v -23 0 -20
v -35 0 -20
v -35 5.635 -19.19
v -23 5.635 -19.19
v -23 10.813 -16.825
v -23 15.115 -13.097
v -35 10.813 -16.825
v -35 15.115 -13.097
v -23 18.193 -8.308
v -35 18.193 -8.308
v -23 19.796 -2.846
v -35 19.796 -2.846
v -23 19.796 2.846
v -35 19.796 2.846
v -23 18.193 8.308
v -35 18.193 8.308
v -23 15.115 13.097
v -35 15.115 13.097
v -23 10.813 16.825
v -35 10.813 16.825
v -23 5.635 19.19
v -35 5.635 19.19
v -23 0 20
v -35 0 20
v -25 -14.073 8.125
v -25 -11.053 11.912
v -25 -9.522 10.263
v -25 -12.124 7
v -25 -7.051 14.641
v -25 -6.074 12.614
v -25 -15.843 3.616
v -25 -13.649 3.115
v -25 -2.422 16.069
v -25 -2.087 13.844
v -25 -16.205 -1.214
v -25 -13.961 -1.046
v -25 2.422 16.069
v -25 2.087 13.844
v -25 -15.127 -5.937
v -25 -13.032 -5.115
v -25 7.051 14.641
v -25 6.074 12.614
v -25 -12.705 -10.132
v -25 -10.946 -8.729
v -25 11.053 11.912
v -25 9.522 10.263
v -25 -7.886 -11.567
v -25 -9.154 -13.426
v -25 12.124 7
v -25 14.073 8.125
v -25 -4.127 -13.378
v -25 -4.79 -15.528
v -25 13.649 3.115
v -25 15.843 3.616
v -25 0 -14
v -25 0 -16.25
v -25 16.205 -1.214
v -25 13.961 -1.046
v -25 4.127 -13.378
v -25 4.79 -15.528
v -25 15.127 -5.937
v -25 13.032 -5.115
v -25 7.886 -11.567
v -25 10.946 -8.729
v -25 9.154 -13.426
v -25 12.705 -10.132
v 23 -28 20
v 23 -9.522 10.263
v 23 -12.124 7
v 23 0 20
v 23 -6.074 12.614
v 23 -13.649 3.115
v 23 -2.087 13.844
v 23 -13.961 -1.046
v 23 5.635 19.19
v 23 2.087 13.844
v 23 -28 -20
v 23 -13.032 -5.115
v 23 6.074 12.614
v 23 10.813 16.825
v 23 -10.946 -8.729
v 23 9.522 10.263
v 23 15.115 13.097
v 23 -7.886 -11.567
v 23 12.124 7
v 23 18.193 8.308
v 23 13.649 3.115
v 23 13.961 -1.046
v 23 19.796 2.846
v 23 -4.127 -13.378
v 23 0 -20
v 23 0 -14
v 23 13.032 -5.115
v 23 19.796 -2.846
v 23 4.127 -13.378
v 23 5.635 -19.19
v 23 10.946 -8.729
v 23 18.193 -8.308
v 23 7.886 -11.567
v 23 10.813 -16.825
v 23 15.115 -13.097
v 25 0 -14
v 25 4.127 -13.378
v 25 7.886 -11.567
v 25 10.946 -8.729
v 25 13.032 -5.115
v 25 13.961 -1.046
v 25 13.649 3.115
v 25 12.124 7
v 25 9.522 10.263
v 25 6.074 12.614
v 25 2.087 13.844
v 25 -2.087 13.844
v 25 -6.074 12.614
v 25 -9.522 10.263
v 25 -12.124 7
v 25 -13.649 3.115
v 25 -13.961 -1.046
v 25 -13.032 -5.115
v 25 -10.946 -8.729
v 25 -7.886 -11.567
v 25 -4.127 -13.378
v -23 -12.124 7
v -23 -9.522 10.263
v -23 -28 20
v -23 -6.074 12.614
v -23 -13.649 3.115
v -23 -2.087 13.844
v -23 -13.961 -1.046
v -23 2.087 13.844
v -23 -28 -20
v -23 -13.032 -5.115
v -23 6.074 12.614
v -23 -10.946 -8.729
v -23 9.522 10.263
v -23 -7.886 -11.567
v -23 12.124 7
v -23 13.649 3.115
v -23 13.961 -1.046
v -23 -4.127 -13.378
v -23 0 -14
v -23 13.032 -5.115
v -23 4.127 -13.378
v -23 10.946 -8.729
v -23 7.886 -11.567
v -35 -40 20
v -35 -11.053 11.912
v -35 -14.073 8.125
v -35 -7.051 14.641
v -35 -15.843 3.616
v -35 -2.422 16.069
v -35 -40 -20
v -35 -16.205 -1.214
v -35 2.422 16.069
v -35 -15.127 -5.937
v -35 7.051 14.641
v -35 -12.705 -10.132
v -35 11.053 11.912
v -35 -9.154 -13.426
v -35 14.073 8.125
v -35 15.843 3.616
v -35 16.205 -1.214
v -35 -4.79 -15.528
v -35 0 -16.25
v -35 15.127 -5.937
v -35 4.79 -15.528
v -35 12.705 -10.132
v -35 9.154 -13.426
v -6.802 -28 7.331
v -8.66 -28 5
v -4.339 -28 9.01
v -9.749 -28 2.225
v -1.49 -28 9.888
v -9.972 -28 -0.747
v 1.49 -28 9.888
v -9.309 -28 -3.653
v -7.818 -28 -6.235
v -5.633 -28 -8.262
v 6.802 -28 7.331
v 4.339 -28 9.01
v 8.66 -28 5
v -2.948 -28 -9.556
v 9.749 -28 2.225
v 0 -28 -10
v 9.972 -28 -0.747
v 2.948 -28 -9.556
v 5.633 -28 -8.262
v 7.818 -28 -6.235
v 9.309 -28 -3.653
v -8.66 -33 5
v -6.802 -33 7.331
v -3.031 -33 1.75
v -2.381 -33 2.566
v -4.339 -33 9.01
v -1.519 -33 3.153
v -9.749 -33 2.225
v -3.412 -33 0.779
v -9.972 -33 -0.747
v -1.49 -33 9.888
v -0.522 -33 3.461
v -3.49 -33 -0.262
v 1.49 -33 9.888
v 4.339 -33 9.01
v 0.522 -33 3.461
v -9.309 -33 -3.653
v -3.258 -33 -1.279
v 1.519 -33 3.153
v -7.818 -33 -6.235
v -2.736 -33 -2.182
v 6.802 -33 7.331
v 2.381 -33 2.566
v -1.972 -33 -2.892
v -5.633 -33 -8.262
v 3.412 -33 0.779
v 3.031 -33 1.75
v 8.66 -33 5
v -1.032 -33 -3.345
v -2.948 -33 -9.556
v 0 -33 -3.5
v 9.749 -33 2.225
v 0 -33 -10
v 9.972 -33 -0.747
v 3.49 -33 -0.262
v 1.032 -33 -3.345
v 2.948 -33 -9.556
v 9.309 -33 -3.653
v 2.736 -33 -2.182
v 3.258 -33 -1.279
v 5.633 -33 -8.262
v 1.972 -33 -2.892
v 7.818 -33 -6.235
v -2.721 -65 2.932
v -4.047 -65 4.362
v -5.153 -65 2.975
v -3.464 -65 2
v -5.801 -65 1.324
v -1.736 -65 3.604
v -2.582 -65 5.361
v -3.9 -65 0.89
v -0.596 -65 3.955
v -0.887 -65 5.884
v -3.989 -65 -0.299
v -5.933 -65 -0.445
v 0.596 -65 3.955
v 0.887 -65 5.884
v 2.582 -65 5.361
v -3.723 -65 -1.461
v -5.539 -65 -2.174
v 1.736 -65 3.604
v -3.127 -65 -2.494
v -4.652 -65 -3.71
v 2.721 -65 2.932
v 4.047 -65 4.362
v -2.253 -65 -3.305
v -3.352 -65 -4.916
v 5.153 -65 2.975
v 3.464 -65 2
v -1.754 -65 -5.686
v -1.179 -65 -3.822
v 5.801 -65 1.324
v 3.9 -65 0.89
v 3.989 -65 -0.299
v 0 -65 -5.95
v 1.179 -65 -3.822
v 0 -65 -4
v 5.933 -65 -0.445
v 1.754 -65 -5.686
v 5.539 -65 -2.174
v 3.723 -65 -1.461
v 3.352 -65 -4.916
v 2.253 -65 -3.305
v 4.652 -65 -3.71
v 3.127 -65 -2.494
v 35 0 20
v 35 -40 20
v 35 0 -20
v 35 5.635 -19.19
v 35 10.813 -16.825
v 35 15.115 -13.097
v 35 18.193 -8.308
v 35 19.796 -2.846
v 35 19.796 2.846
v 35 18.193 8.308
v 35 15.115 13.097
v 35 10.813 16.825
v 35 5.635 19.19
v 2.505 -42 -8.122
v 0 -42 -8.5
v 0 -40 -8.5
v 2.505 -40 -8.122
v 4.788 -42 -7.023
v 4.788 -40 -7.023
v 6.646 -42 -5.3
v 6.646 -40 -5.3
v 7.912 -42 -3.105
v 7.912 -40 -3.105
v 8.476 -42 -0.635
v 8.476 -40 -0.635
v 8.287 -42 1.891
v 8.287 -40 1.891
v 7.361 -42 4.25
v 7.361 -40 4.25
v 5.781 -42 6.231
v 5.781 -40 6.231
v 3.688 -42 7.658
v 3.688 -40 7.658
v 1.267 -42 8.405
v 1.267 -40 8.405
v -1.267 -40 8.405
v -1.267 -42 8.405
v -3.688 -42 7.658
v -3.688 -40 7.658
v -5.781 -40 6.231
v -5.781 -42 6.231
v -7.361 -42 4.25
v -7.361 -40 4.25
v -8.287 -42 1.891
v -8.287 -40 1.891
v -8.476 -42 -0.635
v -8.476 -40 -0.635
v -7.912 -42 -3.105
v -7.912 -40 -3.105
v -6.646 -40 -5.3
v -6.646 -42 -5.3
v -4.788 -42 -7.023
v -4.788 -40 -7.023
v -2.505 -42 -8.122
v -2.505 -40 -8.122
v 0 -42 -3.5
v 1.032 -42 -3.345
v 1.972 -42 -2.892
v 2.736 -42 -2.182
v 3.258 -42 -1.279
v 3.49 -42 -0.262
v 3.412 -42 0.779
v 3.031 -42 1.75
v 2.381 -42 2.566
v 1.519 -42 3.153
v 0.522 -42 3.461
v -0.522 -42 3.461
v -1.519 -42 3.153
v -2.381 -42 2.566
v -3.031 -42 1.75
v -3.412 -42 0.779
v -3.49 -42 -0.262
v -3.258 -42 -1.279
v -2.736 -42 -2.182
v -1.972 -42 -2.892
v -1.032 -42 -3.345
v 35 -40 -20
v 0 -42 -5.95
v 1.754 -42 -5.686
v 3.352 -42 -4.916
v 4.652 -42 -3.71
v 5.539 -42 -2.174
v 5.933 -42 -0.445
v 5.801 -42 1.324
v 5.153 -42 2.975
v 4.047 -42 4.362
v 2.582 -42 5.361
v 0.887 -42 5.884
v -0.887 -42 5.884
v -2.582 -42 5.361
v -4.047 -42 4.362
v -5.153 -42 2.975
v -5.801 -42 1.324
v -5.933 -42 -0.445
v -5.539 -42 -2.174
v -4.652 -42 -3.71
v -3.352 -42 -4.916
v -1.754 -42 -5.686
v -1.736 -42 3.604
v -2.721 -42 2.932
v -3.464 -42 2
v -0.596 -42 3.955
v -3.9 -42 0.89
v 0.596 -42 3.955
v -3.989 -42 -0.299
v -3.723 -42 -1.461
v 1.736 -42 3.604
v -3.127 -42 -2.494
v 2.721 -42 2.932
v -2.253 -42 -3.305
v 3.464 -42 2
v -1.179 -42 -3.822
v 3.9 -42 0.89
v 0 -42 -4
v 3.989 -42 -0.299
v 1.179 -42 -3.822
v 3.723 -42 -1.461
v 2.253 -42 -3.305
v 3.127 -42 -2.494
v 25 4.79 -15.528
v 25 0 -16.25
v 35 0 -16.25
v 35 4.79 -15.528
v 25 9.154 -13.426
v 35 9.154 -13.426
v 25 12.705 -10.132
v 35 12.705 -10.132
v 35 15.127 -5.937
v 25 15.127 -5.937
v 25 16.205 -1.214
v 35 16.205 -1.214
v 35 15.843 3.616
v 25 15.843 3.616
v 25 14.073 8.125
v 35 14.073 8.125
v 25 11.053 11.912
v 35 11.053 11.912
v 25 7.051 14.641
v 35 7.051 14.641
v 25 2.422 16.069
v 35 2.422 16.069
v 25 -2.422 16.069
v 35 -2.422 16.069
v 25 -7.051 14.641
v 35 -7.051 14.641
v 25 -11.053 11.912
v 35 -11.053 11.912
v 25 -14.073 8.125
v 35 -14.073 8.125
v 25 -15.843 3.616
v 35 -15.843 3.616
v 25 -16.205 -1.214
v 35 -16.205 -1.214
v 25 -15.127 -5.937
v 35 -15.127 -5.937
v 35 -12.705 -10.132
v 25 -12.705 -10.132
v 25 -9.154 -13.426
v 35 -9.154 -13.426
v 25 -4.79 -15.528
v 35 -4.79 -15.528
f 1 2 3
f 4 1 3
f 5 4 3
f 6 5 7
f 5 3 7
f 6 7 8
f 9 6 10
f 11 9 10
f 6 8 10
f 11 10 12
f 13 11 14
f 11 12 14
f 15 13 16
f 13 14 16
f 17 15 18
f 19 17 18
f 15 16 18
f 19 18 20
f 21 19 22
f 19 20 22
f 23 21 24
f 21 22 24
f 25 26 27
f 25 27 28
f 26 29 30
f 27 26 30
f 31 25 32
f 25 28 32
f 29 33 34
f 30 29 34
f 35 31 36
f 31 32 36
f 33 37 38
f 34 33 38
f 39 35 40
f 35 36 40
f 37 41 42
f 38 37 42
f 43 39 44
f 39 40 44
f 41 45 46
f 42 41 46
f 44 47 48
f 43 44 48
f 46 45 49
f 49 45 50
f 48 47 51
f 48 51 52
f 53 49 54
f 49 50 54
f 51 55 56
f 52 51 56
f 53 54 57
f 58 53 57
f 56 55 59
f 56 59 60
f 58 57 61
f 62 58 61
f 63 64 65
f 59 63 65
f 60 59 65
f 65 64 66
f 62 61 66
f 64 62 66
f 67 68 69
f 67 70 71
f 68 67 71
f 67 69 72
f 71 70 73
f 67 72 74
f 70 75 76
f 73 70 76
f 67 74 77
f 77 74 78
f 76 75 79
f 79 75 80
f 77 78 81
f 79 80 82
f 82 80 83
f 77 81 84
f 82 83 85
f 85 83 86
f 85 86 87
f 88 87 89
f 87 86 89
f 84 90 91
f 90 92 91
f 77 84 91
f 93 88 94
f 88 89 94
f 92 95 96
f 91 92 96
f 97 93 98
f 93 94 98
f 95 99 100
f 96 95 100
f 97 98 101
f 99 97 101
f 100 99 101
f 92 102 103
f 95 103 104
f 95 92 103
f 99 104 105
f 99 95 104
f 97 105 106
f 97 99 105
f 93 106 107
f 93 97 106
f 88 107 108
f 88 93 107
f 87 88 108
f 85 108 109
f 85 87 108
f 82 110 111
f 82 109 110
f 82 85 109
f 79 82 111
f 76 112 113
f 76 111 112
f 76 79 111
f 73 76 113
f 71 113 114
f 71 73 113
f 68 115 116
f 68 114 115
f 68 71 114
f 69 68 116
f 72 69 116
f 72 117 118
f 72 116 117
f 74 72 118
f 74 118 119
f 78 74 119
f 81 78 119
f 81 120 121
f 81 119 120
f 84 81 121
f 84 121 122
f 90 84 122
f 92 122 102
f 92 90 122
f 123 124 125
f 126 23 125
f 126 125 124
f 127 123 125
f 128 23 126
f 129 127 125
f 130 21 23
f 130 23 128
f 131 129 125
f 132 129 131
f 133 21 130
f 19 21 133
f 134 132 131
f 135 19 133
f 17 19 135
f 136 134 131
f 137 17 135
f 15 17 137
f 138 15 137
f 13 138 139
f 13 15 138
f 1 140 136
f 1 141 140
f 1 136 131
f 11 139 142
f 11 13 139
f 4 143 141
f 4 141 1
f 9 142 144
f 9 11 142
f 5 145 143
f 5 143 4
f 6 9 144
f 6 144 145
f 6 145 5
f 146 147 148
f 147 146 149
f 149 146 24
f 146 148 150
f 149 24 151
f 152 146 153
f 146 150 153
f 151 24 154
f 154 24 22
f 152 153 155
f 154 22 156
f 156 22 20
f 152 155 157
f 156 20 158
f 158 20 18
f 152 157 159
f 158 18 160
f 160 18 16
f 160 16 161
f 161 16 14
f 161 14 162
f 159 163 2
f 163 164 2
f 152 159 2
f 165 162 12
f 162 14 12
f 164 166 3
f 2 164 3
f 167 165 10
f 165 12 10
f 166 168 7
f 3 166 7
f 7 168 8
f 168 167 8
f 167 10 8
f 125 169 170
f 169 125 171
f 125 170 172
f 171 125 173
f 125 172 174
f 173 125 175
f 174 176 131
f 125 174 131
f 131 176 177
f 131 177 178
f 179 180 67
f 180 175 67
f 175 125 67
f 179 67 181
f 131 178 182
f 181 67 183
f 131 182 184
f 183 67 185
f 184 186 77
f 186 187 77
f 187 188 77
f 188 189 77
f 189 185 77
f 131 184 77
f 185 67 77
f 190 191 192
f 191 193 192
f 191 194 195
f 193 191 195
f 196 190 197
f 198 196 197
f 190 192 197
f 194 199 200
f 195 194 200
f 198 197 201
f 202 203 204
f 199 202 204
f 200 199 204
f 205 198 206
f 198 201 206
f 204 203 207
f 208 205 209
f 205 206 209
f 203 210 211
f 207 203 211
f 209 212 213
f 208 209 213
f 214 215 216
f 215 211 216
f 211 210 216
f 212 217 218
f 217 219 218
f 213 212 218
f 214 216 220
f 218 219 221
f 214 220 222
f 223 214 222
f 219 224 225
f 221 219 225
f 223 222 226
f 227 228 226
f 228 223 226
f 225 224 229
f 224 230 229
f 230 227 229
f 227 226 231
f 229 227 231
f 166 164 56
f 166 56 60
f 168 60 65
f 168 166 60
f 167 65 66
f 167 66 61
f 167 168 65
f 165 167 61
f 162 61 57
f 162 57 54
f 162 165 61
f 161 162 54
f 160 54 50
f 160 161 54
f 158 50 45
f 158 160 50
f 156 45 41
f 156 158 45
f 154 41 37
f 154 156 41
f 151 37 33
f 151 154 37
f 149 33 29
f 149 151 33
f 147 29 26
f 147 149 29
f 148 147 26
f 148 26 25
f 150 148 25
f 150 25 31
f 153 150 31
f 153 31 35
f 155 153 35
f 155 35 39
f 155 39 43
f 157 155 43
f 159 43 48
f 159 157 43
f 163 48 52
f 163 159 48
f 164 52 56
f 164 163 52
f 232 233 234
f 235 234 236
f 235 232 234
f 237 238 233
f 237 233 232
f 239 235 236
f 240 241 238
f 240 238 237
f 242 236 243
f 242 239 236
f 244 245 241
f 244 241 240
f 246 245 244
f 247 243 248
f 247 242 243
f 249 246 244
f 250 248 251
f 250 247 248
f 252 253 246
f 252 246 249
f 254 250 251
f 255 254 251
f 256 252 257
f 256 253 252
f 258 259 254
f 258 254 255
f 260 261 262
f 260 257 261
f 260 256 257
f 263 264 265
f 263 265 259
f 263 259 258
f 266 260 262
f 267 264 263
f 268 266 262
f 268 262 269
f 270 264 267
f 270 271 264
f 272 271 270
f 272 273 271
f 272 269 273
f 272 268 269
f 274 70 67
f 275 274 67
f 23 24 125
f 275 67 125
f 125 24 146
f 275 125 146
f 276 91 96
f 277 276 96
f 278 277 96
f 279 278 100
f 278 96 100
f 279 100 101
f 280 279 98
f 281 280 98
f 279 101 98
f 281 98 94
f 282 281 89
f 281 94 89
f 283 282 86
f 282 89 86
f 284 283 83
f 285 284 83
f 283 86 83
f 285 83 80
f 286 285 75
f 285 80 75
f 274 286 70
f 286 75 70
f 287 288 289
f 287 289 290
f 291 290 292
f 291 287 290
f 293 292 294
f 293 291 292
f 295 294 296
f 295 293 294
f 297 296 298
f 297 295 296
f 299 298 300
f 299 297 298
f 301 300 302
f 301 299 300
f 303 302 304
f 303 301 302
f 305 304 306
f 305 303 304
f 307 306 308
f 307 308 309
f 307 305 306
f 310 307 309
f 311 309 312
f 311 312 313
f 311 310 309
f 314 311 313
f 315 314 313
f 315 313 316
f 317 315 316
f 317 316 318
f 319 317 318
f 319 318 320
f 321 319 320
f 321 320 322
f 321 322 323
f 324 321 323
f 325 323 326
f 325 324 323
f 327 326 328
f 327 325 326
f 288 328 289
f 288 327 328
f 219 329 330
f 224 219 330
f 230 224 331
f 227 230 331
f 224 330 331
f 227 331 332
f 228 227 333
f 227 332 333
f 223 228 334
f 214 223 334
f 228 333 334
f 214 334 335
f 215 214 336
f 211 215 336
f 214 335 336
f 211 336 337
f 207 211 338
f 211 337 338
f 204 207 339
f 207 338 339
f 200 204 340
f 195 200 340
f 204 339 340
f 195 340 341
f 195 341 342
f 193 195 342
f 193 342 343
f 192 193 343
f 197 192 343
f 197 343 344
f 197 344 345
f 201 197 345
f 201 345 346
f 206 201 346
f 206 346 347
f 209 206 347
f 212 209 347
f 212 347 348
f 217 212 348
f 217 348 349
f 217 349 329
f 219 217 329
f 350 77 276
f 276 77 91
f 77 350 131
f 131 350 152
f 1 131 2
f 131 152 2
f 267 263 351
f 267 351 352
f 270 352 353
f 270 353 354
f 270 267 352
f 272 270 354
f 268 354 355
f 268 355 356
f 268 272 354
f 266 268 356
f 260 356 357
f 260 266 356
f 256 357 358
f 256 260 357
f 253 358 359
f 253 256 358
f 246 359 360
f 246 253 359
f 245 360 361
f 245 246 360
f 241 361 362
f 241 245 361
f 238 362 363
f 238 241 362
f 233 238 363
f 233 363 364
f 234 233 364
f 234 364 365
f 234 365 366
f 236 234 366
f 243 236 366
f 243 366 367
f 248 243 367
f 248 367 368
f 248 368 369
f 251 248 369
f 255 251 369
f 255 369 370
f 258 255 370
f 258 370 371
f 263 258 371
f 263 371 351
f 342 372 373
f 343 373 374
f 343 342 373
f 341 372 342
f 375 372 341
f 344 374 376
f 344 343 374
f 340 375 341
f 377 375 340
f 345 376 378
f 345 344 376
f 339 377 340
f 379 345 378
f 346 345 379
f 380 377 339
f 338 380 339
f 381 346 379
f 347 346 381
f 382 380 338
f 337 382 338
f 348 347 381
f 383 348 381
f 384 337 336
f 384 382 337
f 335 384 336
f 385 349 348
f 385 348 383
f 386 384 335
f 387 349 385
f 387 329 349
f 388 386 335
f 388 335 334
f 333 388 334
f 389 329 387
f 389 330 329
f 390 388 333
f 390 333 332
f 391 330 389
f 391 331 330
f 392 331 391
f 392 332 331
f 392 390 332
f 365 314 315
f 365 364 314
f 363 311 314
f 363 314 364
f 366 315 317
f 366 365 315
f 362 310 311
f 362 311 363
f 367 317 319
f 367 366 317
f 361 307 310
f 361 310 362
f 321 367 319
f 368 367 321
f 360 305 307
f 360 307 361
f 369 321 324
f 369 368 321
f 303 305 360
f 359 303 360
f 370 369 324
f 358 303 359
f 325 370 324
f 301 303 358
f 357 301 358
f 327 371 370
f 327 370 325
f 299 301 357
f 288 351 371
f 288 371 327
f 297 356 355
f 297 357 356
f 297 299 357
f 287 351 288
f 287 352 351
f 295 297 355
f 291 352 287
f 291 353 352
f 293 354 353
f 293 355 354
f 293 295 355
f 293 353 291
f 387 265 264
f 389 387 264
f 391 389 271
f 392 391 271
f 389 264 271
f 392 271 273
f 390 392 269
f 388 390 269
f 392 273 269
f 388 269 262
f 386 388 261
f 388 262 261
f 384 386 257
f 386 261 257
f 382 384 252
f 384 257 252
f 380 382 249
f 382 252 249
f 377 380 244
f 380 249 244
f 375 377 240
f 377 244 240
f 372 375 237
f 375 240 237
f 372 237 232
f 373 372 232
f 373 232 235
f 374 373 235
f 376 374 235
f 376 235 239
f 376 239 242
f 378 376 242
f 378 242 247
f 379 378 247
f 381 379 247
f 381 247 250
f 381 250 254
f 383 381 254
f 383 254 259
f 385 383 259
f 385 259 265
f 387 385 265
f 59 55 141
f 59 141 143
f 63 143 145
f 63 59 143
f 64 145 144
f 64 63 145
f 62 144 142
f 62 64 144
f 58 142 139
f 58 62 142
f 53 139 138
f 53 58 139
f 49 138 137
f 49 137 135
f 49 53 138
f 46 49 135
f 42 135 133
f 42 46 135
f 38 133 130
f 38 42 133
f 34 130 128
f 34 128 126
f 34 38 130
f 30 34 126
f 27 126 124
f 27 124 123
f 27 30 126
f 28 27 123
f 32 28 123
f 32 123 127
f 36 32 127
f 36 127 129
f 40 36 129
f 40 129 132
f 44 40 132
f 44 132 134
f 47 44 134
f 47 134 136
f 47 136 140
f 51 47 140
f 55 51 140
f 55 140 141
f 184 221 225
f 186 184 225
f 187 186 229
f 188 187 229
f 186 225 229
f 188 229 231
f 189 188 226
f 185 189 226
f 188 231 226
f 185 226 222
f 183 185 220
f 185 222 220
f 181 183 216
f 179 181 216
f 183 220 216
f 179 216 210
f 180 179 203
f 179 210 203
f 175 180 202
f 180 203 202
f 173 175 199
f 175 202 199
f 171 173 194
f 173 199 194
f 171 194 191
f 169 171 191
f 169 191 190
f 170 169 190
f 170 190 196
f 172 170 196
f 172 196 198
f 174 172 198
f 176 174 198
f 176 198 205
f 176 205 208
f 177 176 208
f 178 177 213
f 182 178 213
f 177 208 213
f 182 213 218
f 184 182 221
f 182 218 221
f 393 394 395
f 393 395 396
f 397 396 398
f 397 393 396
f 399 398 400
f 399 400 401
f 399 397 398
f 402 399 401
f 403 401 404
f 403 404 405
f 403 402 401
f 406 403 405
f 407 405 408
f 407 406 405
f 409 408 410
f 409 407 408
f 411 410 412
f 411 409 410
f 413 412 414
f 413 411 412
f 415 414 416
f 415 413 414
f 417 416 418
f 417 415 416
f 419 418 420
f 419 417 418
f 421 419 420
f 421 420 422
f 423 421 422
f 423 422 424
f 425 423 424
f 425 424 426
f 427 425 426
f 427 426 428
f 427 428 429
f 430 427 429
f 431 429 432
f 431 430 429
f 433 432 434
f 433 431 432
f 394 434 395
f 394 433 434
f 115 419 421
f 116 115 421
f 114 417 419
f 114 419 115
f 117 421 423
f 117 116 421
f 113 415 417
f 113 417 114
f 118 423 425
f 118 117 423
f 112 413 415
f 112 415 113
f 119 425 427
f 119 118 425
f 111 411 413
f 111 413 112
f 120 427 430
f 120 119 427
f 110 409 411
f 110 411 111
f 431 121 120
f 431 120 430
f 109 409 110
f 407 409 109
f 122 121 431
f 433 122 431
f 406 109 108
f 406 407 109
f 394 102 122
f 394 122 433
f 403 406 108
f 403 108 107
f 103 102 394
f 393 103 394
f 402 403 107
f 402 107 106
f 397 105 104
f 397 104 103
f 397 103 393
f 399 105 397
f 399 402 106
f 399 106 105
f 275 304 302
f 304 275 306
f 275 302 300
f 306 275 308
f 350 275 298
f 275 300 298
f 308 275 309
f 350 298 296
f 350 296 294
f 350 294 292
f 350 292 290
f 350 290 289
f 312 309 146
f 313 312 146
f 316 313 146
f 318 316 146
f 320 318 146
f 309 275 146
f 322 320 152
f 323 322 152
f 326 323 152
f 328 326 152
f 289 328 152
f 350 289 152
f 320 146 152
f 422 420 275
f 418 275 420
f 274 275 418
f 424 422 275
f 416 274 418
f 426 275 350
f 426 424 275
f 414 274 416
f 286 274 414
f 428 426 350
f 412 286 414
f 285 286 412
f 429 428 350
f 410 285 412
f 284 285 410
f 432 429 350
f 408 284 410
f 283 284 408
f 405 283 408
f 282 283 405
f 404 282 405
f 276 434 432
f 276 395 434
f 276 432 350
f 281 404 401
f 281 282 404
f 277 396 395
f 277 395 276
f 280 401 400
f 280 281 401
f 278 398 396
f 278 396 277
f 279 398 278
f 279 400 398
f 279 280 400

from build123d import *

# Parameters (mm, degrees)
SKETCH005_AS_DRAWN_R                 = 10
EXTRUDE005_DEPTH                     = 5
EXTRUDE005_ONTO_SKETCH005_ROLL_ANGLE = 90
SKETCH001_AS_DRAWN_W                 = 40
SKETCH001_AS_DRAWN_H                 = 70
SKETCH001_AS_DRAWN_R                 = 3.5
EXTRUDE002_DEPTH                     = 12
EXTRUDE002_ONTO_SKETCH001_ROLL_ANGLE = 90
SKETCH004_AS_DRAWN_R                 = 8.5
SKETCH004_AS_DRAWN_R_2               = 3.5
EXTRUDE004_DEPTH                     = 2
EXTRUDE004_ONTO_SKETCH004_ROLL_ANGLE = 90
SKETCH003_AS_DRAWN_R                 = 5.95
SKETCH003_AS_DRAWN_R_2               = 4
EXTRUDE003_DEPTH                     = 25
EXTRUDE003_ONTO_SKETCH003_ROLL_ANGLE = 90
CYLINDER001_R                        = 16.25
CYLINDER001_DEPTH                    = 10
SKETCH_R                             = 14
EXTRUDE_DEPTH                        = 12
CYLINDER_R                           = 16.25
CYLINDER_DEPTH                       = 10
EXTRUDE001_DEPTH                     = 12
FUSION_PITCH_ANGLE                   = 90


with BuildPart() as contra_nut_cut:
    # Sketch005 as drawn → Extrude005 (new)
    with BuildSketch(Plane.XY):
        Circle(SKETCH005_AS_DRAWN_R)
    extrude(amount=-EXTRUDE005_DEPTH)


with BuildPart() as contra_nut_cut_1:
    # Extrude005 onto Sketch005 roll: moved
    add(contra_nut_cut.part.rotate(Axis((0, 0, 0), (1, 0, 0)), EXTRUDE005_ONTO_SKETCH005_ROLL_ANGLE))


with BuildPart() as contra_nut_cut_2:
    # Extrude005 onto Sketch005 placement: moved
    add(contra_nut_cut_1.part)


with BuildPart() as contra_nut_cut_3:
    # Extrude005 placement: moved
    add(contra_nut_cut_2.part.moved(Location((0, -33, 0))))


with BuildPart() as nut_cut:
    # Sketch001 as drawn → Extrude002 (new)
    with BuildSketch(Plane.XY):
        Rectangle(SKETCH001_AS_DRAWN_W, SKETCH001_AS_DRAWN_H)
        Circle(SKETCH001_AS_DRAWN_R, mode=Mode.SUBTRACT)
    extrude(amount=-EXTRUDE002_DEPTH)


with BuildPart() as nut_cut_1:
    # Extrude002 onto Sketch001 roll: moved
    add(nut_cut.part.rotate(Axis((0, 0, 0), (1, 0, 0)), EXTRUDE002_ONTO_SKETCH001_ROLL_ANGLE))


with BuildPart() as nut_cut_2:
    # Extrude002 onto Sketch001 placement: moved
    add(nut_cut_1.part)


with BuildPart() as nut_cut_3:
    # Extrude002 placement: moved
    add(nut_cut_2.part.moved(Location((0, -40, 0))))

    # Cut002: cut contra-nut-cut
    add(contra_nut_cut_3.part, mode=Mode.SUBTRACT)


with BuildPart() as z_bearings_pad:
    # Sketch004 as drawn → Extrude004 (new)
    with BuildSketch(Plane.XY):
        Circle(SKETCH004_AS_DRAWN_R)
        Circle(SKETCH004_AS_DRAWN_R_2, mode=Mode.SUBTRACT)
    extrude(amount=-EXTRUDE004_DEPTH)


with BuildPart() as z_bearings_pad_1:
    # Extrude004 onto Sketch004 roll: moved
    add(z_bearings_pad.part.rotate(Axis((0, 0, 0), (1, 0, 0)), EXTRUDE004_ONTO_SKETCH004_ROLL_ANGLE))


with BuildPart() as z_bearings_pad_2:
    # Extrude004 onto Sketch004 placement: moved
    add(z_bearings_pad_1.part)


with BuildPart() as z_bearings_pad_3:
    # Extrude004 placement: moved
    add(z_bearings_pad_2.part.moved(Location((0, -42, 0))))


with BuildPart() as z_bearings_cylinder:
    # Sketch003 as drawn → Extrude003 (new)
    with BuildSketch(Plane.XY):
        Circle(SKETCH003_AS_DRAWN_R)
        Circle(SKETCH003_AS_DRAWN_R_2, mode=Mode.SUBTRACT)
    extrude(amount=-EXTRUDE003_DEPTH)


with BuildPart() as z_bearings_cylinder_1:
    # Extrude003 onto Sketch003 roll: moved
    add(z_bearings_cylinder.part.rotate(Axis((0, 0, 0), (1, 0, 0)), EXTRUDE003_ONTO_SKETCH003_ROLL_ANGLE))


with BuildPart() as z_bearings_cylinder_2:
    # Extrude003 onto Sketch003 placement: moved
    add(z_bearings_cylinder_1.part)


with BuildPart() as z_bearings_cylinder_3:
    # Extrude003 placement: moved
    add(z_bearings_cylinder_2.part.moved(Location((0, -65, 0))))


with BuildPart() as cylinder001:
    # Cylinder001 → Cylinder001 (new body)
    with BuildSketch(Plane.XY.offset(2)):
        Circle(CYLINDER001_R)
    extrude(amount=CYLINDER001_DEPTH)


with BuildPart() as bearing_nest_r_cut:
    # Sketch → Extrude (new body)
    with BuildSketch(Plane.XY):
        with BuildLine():
            ThreePointArc((20, 0), (0, 20), (-20, 0))
            Line((-20, 0), (-20, -40))
            Line((-20, -40), (20, -40))
            Line((20, -40), (20, 0))
        make_face()
        Circle(SKETCH_R, mode=Mode.SUBTRACT)
    extrude(amount=EXTRUDE_DEPTH)

    # Cut001: cut Cylinder001
    add(cylinder001.part, mode=Mode.SUBTRACT)


with BuildPart() as bearing_nest_r_cut_1:
    # Cut001 placement: moved
    add(bearing_nest_r_cut.part.moved(Location((0, 0, 23))))


with BuildPart() as cylinder:
    # Cylinder → Cylinder (new body)
    with BuildSketch(Plane.XY):
        Circle(CYLINDER_R)
    extrude(amount=CYLINDER_DEPTH)


with BuildPart() as fusion:
    # Sketch → Extrude001 (new body)
    with BuildSketch(Plane.XY):
        with BuildLine():
            ThreePointArc((20, 0), (0, 20), (-20, 0))
            Line((-20, 0), (-20, -40))
            Line((-20, -40), (20, -40))
            Line((20, -40), (20, 0))
        make_face()
        Circle(SKETCH_R, mode=Mode.SUBTRACT)
    extrude(amount=EXTRUDE001_DEPTH)

    # Cut: cut Cylinder
    add(cylinder.part, mode=Mode.SUBTRACT)


with BuildPart() as fusion_1:
    # Cut placement: moved
    add(fusion.part.moved(Location((0, 0, -35))))

    # Fusion: union nut-cut, z-bearings-pad, z-bearings-cylinder, bearing-nest-r-cut
    add(nut_cut_3.part)
    add(z_bearings_pad_3.part)
    add(z_bearings_cylinder_3.part)
    add(bearing_nest_r_cut_1.part)


with BuildPart() as fusion_2:
    # Fusion pitch: moved
    add(fusion_1.part.rotate(Axis((0, 0, 0), (0, 1, 0)), FUSION_PITCH_ANGLE))


with BuildPart() as fusion_3:
    # Fusion placement: moved
    add(fusion_2.part)


solid = fusion_3.part
